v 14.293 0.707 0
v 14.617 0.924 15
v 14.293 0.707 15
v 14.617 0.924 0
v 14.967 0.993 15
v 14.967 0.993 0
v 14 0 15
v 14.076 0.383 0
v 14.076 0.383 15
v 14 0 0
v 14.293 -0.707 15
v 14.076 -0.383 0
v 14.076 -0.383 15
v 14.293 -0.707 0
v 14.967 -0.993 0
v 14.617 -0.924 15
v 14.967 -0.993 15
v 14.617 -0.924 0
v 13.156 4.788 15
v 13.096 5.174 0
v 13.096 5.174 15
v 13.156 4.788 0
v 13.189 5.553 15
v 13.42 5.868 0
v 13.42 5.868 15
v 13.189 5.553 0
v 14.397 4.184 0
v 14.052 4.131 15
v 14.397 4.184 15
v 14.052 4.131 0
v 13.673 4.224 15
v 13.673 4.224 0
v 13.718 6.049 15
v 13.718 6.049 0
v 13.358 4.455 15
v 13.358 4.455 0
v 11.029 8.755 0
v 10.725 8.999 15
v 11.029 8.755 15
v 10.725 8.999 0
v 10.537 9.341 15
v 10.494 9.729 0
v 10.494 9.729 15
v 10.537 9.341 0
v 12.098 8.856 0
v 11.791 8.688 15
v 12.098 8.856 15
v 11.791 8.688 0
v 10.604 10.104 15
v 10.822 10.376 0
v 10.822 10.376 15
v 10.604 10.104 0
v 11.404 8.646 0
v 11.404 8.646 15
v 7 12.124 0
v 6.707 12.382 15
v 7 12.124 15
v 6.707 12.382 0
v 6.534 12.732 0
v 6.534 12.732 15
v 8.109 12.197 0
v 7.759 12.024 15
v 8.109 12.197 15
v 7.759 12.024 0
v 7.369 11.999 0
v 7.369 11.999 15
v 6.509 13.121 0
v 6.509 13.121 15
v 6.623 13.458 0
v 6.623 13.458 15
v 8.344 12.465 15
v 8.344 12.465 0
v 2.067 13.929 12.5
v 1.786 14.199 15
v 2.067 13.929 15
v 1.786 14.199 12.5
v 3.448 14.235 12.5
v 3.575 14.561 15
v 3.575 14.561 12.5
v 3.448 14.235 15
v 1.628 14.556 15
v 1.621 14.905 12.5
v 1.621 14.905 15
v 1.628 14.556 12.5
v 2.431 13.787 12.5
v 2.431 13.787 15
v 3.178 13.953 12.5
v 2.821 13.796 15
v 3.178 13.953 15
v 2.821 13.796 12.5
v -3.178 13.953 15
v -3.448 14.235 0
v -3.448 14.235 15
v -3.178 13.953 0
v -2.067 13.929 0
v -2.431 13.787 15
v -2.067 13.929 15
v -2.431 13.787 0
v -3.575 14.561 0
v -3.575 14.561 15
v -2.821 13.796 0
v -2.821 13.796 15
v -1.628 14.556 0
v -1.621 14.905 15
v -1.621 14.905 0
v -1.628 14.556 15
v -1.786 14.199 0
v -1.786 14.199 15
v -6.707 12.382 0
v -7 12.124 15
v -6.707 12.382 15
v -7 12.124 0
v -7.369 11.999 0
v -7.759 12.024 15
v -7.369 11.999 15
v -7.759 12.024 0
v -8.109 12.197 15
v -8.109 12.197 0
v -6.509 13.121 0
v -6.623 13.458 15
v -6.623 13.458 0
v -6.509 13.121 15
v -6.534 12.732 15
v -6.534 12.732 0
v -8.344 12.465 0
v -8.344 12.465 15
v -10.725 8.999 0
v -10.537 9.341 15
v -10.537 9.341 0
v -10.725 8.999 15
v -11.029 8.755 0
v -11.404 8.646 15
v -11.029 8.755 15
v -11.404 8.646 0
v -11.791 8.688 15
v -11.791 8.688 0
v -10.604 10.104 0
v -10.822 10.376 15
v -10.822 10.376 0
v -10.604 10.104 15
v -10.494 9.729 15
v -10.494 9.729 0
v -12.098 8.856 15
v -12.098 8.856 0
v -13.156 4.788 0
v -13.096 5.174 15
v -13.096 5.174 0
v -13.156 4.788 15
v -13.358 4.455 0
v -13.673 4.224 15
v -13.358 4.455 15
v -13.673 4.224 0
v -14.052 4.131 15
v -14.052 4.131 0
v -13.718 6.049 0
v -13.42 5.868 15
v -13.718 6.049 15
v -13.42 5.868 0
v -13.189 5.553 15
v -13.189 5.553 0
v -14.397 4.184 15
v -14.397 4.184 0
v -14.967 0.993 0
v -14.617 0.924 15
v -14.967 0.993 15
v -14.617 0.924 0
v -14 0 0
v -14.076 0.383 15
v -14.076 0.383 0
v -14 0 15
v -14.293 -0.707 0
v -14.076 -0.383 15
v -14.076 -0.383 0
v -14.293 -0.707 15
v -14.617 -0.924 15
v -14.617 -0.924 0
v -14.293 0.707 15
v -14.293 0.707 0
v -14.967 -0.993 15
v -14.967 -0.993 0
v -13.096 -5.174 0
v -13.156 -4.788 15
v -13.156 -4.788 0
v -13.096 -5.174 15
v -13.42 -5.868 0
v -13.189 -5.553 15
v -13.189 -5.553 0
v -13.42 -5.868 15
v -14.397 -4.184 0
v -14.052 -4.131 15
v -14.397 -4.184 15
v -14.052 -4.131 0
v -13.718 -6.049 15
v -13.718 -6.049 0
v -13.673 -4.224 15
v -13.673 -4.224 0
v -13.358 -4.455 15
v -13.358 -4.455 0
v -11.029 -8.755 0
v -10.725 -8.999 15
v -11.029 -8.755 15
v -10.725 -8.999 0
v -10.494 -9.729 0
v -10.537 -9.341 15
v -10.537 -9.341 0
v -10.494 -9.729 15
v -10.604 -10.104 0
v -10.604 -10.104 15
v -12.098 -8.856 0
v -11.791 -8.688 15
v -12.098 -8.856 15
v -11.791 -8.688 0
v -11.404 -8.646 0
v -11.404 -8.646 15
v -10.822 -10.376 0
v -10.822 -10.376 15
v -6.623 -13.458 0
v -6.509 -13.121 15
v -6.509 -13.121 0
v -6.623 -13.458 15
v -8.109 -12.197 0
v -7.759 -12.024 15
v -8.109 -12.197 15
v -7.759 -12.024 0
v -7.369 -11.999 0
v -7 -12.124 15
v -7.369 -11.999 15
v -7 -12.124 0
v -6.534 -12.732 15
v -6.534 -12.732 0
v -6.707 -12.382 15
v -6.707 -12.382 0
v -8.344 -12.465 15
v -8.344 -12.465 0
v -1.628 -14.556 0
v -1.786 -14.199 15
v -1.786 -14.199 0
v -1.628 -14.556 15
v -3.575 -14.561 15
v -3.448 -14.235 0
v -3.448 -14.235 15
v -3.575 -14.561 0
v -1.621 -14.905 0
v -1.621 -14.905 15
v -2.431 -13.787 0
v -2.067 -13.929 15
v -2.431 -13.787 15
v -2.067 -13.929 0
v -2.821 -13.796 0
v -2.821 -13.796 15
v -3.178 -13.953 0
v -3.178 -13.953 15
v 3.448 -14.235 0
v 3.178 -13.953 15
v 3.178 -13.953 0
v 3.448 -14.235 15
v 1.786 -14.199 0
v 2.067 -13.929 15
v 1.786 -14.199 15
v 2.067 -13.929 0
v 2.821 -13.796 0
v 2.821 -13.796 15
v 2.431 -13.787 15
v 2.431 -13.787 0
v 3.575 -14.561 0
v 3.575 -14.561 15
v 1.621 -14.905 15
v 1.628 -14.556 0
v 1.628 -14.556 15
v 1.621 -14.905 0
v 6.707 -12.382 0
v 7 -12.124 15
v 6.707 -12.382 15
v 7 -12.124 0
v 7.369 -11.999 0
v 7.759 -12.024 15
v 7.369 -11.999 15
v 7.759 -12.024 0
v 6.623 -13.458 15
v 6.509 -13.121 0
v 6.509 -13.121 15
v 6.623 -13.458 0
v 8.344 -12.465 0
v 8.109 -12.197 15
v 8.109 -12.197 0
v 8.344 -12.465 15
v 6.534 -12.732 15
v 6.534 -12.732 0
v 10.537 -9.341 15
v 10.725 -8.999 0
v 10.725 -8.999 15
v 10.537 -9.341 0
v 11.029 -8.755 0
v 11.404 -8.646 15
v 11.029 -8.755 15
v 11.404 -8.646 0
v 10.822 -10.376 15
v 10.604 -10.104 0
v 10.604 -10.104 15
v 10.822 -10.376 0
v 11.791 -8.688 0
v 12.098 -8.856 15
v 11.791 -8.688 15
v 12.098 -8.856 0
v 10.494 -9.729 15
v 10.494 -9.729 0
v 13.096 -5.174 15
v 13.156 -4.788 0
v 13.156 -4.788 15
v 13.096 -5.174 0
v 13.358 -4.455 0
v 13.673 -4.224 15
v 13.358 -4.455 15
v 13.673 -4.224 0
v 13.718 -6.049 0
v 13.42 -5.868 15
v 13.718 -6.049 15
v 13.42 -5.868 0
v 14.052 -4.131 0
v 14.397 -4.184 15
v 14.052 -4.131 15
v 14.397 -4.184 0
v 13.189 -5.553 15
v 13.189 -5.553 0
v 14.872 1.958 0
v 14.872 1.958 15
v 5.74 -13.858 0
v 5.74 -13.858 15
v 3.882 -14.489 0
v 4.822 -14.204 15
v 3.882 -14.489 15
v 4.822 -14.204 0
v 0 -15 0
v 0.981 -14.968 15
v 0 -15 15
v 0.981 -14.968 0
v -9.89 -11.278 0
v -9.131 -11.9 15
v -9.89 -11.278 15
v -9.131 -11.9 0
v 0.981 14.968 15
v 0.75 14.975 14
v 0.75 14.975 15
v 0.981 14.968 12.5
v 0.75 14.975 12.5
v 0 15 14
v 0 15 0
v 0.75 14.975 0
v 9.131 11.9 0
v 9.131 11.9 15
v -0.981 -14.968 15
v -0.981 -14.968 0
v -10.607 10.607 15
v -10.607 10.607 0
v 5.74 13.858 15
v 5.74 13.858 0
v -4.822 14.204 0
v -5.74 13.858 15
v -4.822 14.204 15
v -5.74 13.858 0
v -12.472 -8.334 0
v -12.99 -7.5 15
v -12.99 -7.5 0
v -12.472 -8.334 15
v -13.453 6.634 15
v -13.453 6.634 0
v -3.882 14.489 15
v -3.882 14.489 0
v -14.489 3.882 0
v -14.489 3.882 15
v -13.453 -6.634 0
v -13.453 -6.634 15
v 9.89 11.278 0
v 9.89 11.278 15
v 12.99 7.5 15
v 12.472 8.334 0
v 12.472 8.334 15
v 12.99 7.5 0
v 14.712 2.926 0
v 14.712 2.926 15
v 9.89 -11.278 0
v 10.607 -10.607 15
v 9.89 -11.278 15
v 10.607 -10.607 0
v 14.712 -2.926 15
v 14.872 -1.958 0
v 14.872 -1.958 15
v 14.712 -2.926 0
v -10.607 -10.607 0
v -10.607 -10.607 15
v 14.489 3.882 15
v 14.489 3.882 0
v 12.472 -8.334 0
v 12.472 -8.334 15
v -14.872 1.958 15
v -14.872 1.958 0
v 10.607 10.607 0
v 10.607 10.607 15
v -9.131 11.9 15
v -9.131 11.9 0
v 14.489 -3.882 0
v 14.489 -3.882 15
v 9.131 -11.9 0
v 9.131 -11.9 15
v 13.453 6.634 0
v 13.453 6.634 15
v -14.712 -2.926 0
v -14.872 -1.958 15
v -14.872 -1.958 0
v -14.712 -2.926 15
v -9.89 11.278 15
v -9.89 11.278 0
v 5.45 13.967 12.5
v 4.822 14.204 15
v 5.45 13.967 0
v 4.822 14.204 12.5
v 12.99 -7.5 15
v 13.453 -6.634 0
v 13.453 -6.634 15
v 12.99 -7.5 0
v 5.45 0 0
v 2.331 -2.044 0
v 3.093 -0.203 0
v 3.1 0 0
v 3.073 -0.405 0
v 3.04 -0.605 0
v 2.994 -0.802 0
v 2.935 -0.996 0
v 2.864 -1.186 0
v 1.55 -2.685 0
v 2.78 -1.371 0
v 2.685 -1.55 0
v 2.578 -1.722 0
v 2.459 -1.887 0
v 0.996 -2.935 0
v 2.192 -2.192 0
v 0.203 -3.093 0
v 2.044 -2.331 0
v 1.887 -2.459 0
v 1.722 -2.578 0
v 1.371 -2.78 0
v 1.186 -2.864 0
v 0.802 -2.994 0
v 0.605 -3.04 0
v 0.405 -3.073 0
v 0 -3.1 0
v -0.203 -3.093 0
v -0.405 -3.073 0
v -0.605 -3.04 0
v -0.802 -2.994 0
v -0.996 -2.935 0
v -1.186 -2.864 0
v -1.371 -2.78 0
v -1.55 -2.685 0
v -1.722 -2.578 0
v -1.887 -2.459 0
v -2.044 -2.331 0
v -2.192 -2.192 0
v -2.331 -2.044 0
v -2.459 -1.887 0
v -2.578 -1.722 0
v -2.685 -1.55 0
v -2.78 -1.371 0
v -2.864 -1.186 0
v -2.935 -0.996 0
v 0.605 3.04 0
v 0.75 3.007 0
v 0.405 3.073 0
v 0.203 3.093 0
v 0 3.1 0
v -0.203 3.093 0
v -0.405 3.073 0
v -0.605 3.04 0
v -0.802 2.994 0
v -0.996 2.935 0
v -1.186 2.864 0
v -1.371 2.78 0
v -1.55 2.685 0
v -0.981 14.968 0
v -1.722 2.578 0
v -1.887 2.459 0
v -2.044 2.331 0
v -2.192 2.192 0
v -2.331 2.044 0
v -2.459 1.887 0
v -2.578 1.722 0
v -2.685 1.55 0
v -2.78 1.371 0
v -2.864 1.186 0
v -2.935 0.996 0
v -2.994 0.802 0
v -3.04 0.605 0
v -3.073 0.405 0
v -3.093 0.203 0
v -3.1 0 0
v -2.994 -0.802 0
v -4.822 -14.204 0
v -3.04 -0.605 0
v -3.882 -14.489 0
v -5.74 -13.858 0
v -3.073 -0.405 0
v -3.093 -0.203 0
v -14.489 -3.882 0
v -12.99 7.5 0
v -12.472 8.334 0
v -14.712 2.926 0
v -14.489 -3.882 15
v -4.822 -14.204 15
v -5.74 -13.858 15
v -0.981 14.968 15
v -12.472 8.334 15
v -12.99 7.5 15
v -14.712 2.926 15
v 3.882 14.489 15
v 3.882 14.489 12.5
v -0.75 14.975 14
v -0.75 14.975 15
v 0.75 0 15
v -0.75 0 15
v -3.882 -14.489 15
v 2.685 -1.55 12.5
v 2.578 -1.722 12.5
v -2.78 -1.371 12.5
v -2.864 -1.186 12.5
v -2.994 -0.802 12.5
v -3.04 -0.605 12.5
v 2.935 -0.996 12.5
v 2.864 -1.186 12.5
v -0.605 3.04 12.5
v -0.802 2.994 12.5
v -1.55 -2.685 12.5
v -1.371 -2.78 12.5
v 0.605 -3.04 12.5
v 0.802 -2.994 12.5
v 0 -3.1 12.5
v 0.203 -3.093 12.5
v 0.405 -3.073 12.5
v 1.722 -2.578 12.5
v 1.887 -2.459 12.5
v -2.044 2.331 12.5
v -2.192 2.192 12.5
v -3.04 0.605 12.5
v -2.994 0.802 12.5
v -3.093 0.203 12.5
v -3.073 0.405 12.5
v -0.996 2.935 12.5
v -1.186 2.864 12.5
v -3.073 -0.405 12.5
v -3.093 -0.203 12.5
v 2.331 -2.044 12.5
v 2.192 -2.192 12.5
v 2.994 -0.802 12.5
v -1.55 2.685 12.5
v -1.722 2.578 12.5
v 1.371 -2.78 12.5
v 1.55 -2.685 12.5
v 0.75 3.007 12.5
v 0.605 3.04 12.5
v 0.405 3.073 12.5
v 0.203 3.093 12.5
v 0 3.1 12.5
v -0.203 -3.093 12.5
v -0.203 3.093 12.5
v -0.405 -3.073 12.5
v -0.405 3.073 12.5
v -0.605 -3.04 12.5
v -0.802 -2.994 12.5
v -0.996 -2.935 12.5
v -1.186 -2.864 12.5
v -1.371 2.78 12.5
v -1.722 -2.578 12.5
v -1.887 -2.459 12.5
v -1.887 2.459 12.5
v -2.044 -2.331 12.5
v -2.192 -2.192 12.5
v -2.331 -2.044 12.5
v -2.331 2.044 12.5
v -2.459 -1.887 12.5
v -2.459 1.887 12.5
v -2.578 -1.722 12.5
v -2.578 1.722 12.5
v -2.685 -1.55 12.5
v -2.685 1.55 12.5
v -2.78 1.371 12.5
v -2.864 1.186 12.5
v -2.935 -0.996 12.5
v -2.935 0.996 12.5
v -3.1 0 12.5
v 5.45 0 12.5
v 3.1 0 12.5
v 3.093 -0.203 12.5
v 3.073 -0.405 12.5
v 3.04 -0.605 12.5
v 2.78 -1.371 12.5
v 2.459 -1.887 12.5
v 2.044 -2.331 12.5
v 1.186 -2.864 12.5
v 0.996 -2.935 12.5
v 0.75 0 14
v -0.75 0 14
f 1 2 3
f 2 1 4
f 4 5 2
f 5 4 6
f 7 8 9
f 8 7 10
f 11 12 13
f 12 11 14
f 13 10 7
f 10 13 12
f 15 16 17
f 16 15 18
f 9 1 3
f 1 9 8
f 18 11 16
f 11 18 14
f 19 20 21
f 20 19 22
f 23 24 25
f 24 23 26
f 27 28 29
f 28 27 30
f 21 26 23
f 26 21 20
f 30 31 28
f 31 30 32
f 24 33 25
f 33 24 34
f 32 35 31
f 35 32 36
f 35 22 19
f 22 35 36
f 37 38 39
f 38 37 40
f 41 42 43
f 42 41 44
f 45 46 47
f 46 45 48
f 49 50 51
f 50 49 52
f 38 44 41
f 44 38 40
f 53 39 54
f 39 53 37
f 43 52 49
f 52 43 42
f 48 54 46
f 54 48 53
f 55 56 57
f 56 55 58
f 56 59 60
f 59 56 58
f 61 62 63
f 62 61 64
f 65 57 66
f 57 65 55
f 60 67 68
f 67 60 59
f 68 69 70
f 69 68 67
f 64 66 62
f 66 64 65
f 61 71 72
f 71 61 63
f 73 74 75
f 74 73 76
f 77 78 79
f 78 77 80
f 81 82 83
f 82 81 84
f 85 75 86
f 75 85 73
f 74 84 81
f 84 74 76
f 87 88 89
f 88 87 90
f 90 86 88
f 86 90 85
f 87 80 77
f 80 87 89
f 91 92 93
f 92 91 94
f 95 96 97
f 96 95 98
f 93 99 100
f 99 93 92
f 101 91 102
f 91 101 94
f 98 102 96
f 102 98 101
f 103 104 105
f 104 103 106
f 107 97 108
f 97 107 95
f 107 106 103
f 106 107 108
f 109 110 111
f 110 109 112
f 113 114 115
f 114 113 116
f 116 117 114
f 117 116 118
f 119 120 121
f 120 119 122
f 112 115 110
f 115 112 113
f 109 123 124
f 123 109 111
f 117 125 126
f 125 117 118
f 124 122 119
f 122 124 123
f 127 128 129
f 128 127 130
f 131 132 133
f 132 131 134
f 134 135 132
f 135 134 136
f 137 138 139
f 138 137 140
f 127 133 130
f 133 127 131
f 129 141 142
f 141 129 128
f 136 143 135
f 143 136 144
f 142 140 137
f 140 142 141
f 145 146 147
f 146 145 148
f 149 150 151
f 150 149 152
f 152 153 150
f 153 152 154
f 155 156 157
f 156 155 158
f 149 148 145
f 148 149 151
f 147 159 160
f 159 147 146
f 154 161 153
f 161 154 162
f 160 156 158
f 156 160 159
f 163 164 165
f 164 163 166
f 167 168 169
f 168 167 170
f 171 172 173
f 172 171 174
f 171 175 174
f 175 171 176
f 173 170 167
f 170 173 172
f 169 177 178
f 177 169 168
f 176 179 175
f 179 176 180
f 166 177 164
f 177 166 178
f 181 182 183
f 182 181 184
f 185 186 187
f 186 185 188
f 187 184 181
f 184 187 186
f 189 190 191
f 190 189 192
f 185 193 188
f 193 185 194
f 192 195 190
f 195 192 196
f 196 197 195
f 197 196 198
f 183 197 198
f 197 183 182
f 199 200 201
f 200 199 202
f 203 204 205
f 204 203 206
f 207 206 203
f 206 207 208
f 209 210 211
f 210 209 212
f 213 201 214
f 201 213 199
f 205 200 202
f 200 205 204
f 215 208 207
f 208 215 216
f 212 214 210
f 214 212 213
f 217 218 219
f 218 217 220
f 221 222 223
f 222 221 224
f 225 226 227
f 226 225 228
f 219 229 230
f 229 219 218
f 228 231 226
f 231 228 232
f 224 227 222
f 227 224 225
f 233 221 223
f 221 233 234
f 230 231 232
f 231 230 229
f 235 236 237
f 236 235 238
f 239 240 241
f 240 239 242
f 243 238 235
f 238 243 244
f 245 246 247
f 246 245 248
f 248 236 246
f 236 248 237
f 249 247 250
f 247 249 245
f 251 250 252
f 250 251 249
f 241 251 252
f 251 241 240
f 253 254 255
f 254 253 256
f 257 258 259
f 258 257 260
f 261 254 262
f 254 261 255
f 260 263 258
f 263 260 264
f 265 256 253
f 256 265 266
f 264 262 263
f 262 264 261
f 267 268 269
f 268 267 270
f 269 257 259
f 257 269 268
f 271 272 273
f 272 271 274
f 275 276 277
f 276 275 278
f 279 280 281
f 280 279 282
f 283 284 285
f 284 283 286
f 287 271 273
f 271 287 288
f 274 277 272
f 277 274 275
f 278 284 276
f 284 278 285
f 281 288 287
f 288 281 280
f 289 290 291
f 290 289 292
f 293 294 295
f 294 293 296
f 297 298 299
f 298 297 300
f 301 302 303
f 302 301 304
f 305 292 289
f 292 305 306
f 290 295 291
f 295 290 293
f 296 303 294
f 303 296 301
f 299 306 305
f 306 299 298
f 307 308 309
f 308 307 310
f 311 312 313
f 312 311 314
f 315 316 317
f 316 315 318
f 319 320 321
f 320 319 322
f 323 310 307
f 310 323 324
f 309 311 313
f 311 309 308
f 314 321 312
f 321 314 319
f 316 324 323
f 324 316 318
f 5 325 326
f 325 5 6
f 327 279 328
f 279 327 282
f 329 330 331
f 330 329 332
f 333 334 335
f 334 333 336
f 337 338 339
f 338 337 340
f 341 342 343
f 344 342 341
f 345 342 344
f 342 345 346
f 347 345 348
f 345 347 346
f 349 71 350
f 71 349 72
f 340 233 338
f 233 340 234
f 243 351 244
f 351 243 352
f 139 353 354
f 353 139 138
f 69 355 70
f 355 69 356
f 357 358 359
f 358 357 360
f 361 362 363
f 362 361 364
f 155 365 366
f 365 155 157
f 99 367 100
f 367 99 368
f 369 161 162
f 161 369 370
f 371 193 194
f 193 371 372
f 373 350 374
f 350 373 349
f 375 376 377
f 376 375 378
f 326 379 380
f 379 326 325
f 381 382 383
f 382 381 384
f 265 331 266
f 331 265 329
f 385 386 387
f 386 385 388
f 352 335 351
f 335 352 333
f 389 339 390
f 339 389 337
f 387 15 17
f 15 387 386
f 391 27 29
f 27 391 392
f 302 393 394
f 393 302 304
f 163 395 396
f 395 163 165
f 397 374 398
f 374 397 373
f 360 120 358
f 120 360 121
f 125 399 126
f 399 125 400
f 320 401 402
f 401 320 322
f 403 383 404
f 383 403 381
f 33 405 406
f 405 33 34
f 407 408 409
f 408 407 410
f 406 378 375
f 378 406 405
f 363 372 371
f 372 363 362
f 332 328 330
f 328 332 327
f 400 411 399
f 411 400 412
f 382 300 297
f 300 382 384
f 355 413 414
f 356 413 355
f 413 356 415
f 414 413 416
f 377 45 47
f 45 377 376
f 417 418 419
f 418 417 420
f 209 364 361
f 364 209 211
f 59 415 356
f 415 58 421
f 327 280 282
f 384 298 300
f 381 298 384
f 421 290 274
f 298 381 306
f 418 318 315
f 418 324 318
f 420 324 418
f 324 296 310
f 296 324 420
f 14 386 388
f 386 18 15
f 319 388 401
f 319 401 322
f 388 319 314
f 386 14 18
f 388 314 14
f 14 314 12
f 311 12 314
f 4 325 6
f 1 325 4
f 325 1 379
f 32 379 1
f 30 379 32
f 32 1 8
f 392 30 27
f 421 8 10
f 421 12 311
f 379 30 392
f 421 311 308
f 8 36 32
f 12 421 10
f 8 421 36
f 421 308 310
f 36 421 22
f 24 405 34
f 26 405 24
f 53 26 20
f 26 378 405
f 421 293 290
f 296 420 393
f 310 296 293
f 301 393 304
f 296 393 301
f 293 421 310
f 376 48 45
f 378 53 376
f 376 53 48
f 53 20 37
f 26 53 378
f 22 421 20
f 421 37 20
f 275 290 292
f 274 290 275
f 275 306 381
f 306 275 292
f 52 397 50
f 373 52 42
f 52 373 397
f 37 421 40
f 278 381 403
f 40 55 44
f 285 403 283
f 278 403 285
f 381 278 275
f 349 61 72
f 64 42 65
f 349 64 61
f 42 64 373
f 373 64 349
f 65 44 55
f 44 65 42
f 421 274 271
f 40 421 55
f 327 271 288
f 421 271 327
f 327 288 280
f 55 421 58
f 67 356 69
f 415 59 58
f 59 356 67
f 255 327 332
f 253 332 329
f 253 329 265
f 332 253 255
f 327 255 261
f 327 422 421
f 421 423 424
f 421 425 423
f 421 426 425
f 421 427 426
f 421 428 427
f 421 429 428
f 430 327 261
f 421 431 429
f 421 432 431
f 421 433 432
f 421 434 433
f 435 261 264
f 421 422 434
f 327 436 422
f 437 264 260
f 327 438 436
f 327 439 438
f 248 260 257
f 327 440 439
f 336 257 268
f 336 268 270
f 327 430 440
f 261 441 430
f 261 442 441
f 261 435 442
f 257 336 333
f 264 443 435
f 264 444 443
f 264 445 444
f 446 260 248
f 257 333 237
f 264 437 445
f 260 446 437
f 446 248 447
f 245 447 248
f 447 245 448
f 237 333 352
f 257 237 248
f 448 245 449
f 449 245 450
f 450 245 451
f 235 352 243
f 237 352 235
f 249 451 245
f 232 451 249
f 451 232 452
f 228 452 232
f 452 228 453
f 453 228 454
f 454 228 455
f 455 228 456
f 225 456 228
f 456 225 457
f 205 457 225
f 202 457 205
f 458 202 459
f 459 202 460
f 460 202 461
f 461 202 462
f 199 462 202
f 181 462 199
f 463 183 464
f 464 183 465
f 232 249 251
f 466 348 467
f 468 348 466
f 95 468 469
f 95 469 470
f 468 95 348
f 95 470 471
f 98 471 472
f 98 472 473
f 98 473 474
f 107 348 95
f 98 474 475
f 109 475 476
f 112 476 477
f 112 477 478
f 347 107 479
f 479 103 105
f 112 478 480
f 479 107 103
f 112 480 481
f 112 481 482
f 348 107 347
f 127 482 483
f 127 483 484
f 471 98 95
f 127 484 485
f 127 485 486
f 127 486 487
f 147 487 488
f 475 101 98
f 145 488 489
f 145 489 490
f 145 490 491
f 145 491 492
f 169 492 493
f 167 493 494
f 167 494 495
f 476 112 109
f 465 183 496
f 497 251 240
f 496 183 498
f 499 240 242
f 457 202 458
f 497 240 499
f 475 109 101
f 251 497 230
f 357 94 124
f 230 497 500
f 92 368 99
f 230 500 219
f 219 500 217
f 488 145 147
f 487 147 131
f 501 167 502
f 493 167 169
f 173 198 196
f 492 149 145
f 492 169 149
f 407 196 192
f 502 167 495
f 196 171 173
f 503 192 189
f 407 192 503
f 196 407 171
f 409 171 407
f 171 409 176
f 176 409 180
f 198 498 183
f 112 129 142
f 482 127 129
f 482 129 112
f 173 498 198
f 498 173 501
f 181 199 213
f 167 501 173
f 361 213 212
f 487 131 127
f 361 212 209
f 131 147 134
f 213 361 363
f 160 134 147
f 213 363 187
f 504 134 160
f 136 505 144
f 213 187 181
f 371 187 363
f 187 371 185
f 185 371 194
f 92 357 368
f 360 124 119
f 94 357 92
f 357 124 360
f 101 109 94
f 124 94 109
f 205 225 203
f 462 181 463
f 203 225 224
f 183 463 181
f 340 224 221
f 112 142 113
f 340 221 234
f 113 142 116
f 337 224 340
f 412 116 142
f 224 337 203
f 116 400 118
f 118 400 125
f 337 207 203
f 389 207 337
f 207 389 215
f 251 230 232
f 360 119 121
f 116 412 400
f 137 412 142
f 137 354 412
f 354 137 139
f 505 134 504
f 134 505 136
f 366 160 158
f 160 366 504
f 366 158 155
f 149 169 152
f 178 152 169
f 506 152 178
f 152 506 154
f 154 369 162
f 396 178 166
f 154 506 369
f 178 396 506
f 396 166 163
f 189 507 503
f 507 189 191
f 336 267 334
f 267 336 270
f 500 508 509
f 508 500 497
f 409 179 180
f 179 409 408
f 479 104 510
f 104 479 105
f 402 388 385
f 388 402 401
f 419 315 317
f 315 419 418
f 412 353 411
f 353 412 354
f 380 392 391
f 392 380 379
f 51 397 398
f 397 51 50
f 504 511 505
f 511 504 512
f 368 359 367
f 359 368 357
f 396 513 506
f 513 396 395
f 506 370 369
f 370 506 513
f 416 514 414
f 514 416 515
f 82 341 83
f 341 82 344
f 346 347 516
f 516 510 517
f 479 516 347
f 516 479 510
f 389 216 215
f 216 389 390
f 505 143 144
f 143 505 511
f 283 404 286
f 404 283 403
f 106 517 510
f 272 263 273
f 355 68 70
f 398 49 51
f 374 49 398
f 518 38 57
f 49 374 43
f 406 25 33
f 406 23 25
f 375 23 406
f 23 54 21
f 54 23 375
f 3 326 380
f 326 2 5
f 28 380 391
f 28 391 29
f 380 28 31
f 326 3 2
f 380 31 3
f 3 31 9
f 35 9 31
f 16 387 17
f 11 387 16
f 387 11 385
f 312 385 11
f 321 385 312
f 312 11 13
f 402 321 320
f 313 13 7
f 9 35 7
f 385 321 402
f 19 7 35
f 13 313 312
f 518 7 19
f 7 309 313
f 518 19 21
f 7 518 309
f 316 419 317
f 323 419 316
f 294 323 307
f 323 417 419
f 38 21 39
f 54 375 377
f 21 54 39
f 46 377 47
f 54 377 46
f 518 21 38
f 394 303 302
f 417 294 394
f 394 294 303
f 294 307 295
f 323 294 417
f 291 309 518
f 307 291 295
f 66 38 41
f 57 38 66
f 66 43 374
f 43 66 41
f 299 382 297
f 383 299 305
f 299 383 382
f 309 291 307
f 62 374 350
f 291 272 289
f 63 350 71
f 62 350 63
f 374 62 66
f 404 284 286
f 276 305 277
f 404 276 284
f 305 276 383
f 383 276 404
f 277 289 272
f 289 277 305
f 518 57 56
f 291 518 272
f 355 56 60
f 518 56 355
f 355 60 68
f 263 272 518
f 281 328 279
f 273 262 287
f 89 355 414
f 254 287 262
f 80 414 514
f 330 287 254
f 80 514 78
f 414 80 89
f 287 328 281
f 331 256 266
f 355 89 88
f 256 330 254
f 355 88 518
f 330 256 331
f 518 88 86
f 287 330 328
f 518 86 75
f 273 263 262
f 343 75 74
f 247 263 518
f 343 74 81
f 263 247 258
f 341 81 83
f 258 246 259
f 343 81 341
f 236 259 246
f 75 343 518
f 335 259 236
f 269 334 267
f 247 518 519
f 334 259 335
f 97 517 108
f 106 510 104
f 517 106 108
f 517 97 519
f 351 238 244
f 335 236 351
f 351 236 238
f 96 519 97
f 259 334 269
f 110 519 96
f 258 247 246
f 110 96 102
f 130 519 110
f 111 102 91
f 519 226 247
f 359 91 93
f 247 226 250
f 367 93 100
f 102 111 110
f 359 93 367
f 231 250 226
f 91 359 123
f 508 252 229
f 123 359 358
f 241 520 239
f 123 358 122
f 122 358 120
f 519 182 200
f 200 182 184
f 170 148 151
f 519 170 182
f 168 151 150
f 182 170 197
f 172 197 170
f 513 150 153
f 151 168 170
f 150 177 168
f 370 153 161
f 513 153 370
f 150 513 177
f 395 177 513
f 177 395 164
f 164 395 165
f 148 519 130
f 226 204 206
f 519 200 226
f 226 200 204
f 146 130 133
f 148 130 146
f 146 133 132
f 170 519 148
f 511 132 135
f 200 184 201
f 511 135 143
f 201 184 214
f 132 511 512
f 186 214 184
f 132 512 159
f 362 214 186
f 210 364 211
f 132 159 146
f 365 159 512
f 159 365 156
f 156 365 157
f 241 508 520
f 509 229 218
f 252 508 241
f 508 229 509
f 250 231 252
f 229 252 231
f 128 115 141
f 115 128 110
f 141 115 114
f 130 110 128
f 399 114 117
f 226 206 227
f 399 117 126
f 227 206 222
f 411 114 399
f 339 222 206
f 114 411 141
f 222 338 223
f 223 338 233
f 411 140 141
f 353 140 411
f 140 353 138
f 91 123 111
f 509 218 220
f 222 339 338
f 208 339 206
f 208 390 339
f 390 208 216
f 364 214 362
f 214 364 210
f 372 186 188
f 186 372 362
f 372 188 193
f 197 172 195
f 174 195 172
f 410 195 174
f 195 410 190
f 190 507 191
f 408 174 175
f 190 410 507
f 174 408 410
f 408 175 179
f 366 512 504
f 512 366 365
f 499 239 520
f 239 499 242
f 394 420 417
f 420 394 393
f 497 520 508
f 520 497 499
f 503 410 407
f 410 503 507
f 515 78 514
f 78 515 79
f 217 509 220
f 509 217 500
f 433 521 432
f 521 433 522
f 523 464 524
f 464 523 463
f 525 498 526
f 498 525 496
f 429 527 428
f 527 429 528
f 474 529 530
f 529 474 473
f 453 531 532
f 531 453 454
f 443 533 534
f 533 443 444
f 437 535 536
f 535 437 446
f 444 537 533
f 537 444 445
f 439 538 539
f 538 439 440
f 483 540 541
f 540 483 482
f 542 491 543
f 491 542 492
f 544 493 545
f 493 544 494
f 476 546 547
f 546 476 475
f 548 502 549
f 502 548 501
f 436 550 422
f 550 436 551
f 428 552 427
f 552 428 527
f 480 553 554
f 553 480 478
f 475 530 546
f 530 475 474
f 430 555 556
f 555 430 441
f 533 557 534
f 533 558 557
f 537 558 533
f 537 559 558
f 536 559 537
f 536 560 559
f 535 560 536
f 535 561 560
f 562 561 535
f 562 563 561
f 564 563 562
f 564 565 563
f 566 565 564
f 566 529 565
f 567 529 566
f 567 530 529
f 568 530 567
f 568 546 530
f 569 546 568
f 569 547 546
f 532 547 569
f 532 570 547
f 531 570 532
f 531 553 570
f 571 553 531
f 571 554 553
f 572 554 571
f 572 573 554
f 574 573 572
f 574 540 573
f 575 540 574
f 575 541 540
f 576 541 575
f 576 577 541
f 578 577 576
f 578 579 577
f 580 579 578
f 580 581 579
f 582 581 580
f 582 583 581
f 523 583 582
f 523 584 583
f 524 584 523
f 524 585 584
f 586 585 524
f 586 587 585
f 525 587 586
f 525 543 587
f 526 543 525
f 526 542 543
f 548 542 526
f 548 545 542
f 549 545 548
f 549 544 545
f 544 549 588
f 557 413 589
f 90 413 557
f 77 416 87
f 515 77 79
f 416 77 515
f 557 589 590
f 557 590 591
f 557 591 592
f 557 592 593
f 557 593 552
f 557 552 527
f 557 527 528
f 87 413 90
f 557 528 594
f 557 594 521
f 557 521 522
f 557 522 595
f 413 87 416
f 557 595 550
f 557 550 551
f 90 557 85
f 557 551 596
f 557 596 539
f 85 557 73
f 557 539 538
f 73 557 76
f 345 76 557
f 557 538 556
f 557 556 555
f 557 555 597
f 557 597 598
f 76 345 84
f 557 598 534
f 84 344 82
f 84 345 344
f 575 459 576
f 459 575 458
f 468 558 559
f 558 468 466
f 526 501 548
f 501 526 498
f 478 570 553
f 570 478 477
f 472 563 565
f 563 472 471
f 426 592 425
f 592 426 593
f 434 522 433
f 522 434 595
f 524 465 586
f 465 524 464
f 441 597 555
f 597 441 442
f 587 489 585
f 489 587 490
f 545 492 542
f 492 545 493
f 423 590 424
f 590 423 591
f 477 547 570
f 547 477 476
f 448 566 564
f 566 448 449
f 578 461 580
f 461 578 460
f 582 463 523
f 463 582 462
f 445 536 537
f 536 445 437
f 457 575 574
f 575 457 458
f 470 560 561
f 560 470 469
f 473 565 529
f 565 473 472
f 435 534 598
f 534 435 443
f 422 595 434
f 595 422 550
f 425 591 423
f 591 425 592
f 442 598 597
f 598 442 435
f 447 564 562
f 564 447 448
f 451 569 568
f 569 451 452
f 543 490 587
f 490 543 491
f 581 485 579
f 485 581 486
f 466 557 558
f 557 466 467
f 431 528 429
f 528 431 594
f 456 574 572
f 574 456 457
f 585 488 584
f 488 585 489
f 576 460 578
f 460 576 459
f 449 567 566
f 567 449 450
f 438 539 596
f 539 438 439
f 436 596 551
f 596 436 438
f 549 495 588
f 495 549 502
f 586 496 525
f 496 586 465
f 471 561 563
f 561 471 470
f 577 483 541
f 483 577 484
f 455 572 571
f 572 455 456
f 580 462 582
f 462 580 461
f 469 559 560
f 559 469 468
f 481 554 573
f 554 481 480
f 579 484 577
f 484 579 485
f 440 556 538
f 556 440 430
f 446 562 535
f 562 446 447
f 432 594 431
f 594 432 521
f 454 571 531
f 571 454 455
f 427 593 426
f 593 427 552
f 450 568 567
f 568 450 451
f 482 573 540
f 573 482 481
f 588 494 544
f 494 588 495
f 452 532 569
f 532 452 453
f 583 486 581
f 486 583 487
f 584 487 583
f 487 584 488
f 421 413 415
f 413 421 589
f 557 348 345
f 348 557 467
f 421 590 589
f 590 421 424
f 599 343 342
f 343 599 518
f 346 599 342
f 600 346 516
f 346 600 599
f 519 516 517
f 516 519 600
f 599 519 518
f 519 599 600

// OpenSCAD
// Replacement knob for hotplate stirrer (D-shaft)
// Print orientation: flat bottom face on bed (z = 0)

// ---- Dimensions (mm) ----
knob_d        = 30;    // knob outer diameter
knob_h        = 15;    // knob height
bore_depth    = 12;    // D-bore depth from bottom face
bore_w        = 4.7;   // D-bore width (flat to opposite side)
bore_d        = 6.2;   // D-bore circle diameter
groove_count  = 18;    // number of grip grooves
groove_d      = 2;     // grip groove diameter
pointer_w     = 1.5;   // pointer groove width
pointer_d     = 1;     // pointer groove depth
eps           = 0.5;   // overcut for clean differences

$fn = 96;

difference() {
    // Main body
    cylinder(d = knob_d, h = knob_h);

    // D-shaped blind bore from bottom face
    translate([0, 0, -eps])
        cylinder(d = bore_d, h = bore_depth + 2 * eps);
    translate([-(bore_w - bore_d) / 2, 0, -eps])
        cube([bore_w, knob_d, bore_depth + 2 * eps]);

    // Vertical grip grooves along full height
    for (i = [0 : groove_count - 1])
        rotate([0, 0, i * 360 / groove_count])
            translate([knob_d / 2, 0, -eps])
                cylinder(d = groove_d, h = knob_h + 2 * eps, $fn = 16);

    // Pointer groove from centre to outer edge, same side as flat
    translate([-pointer_w / 2, 0, knob_h - pointer_d])
        cube([pointer_w, knob_d / 2, pointer_d]);
}
